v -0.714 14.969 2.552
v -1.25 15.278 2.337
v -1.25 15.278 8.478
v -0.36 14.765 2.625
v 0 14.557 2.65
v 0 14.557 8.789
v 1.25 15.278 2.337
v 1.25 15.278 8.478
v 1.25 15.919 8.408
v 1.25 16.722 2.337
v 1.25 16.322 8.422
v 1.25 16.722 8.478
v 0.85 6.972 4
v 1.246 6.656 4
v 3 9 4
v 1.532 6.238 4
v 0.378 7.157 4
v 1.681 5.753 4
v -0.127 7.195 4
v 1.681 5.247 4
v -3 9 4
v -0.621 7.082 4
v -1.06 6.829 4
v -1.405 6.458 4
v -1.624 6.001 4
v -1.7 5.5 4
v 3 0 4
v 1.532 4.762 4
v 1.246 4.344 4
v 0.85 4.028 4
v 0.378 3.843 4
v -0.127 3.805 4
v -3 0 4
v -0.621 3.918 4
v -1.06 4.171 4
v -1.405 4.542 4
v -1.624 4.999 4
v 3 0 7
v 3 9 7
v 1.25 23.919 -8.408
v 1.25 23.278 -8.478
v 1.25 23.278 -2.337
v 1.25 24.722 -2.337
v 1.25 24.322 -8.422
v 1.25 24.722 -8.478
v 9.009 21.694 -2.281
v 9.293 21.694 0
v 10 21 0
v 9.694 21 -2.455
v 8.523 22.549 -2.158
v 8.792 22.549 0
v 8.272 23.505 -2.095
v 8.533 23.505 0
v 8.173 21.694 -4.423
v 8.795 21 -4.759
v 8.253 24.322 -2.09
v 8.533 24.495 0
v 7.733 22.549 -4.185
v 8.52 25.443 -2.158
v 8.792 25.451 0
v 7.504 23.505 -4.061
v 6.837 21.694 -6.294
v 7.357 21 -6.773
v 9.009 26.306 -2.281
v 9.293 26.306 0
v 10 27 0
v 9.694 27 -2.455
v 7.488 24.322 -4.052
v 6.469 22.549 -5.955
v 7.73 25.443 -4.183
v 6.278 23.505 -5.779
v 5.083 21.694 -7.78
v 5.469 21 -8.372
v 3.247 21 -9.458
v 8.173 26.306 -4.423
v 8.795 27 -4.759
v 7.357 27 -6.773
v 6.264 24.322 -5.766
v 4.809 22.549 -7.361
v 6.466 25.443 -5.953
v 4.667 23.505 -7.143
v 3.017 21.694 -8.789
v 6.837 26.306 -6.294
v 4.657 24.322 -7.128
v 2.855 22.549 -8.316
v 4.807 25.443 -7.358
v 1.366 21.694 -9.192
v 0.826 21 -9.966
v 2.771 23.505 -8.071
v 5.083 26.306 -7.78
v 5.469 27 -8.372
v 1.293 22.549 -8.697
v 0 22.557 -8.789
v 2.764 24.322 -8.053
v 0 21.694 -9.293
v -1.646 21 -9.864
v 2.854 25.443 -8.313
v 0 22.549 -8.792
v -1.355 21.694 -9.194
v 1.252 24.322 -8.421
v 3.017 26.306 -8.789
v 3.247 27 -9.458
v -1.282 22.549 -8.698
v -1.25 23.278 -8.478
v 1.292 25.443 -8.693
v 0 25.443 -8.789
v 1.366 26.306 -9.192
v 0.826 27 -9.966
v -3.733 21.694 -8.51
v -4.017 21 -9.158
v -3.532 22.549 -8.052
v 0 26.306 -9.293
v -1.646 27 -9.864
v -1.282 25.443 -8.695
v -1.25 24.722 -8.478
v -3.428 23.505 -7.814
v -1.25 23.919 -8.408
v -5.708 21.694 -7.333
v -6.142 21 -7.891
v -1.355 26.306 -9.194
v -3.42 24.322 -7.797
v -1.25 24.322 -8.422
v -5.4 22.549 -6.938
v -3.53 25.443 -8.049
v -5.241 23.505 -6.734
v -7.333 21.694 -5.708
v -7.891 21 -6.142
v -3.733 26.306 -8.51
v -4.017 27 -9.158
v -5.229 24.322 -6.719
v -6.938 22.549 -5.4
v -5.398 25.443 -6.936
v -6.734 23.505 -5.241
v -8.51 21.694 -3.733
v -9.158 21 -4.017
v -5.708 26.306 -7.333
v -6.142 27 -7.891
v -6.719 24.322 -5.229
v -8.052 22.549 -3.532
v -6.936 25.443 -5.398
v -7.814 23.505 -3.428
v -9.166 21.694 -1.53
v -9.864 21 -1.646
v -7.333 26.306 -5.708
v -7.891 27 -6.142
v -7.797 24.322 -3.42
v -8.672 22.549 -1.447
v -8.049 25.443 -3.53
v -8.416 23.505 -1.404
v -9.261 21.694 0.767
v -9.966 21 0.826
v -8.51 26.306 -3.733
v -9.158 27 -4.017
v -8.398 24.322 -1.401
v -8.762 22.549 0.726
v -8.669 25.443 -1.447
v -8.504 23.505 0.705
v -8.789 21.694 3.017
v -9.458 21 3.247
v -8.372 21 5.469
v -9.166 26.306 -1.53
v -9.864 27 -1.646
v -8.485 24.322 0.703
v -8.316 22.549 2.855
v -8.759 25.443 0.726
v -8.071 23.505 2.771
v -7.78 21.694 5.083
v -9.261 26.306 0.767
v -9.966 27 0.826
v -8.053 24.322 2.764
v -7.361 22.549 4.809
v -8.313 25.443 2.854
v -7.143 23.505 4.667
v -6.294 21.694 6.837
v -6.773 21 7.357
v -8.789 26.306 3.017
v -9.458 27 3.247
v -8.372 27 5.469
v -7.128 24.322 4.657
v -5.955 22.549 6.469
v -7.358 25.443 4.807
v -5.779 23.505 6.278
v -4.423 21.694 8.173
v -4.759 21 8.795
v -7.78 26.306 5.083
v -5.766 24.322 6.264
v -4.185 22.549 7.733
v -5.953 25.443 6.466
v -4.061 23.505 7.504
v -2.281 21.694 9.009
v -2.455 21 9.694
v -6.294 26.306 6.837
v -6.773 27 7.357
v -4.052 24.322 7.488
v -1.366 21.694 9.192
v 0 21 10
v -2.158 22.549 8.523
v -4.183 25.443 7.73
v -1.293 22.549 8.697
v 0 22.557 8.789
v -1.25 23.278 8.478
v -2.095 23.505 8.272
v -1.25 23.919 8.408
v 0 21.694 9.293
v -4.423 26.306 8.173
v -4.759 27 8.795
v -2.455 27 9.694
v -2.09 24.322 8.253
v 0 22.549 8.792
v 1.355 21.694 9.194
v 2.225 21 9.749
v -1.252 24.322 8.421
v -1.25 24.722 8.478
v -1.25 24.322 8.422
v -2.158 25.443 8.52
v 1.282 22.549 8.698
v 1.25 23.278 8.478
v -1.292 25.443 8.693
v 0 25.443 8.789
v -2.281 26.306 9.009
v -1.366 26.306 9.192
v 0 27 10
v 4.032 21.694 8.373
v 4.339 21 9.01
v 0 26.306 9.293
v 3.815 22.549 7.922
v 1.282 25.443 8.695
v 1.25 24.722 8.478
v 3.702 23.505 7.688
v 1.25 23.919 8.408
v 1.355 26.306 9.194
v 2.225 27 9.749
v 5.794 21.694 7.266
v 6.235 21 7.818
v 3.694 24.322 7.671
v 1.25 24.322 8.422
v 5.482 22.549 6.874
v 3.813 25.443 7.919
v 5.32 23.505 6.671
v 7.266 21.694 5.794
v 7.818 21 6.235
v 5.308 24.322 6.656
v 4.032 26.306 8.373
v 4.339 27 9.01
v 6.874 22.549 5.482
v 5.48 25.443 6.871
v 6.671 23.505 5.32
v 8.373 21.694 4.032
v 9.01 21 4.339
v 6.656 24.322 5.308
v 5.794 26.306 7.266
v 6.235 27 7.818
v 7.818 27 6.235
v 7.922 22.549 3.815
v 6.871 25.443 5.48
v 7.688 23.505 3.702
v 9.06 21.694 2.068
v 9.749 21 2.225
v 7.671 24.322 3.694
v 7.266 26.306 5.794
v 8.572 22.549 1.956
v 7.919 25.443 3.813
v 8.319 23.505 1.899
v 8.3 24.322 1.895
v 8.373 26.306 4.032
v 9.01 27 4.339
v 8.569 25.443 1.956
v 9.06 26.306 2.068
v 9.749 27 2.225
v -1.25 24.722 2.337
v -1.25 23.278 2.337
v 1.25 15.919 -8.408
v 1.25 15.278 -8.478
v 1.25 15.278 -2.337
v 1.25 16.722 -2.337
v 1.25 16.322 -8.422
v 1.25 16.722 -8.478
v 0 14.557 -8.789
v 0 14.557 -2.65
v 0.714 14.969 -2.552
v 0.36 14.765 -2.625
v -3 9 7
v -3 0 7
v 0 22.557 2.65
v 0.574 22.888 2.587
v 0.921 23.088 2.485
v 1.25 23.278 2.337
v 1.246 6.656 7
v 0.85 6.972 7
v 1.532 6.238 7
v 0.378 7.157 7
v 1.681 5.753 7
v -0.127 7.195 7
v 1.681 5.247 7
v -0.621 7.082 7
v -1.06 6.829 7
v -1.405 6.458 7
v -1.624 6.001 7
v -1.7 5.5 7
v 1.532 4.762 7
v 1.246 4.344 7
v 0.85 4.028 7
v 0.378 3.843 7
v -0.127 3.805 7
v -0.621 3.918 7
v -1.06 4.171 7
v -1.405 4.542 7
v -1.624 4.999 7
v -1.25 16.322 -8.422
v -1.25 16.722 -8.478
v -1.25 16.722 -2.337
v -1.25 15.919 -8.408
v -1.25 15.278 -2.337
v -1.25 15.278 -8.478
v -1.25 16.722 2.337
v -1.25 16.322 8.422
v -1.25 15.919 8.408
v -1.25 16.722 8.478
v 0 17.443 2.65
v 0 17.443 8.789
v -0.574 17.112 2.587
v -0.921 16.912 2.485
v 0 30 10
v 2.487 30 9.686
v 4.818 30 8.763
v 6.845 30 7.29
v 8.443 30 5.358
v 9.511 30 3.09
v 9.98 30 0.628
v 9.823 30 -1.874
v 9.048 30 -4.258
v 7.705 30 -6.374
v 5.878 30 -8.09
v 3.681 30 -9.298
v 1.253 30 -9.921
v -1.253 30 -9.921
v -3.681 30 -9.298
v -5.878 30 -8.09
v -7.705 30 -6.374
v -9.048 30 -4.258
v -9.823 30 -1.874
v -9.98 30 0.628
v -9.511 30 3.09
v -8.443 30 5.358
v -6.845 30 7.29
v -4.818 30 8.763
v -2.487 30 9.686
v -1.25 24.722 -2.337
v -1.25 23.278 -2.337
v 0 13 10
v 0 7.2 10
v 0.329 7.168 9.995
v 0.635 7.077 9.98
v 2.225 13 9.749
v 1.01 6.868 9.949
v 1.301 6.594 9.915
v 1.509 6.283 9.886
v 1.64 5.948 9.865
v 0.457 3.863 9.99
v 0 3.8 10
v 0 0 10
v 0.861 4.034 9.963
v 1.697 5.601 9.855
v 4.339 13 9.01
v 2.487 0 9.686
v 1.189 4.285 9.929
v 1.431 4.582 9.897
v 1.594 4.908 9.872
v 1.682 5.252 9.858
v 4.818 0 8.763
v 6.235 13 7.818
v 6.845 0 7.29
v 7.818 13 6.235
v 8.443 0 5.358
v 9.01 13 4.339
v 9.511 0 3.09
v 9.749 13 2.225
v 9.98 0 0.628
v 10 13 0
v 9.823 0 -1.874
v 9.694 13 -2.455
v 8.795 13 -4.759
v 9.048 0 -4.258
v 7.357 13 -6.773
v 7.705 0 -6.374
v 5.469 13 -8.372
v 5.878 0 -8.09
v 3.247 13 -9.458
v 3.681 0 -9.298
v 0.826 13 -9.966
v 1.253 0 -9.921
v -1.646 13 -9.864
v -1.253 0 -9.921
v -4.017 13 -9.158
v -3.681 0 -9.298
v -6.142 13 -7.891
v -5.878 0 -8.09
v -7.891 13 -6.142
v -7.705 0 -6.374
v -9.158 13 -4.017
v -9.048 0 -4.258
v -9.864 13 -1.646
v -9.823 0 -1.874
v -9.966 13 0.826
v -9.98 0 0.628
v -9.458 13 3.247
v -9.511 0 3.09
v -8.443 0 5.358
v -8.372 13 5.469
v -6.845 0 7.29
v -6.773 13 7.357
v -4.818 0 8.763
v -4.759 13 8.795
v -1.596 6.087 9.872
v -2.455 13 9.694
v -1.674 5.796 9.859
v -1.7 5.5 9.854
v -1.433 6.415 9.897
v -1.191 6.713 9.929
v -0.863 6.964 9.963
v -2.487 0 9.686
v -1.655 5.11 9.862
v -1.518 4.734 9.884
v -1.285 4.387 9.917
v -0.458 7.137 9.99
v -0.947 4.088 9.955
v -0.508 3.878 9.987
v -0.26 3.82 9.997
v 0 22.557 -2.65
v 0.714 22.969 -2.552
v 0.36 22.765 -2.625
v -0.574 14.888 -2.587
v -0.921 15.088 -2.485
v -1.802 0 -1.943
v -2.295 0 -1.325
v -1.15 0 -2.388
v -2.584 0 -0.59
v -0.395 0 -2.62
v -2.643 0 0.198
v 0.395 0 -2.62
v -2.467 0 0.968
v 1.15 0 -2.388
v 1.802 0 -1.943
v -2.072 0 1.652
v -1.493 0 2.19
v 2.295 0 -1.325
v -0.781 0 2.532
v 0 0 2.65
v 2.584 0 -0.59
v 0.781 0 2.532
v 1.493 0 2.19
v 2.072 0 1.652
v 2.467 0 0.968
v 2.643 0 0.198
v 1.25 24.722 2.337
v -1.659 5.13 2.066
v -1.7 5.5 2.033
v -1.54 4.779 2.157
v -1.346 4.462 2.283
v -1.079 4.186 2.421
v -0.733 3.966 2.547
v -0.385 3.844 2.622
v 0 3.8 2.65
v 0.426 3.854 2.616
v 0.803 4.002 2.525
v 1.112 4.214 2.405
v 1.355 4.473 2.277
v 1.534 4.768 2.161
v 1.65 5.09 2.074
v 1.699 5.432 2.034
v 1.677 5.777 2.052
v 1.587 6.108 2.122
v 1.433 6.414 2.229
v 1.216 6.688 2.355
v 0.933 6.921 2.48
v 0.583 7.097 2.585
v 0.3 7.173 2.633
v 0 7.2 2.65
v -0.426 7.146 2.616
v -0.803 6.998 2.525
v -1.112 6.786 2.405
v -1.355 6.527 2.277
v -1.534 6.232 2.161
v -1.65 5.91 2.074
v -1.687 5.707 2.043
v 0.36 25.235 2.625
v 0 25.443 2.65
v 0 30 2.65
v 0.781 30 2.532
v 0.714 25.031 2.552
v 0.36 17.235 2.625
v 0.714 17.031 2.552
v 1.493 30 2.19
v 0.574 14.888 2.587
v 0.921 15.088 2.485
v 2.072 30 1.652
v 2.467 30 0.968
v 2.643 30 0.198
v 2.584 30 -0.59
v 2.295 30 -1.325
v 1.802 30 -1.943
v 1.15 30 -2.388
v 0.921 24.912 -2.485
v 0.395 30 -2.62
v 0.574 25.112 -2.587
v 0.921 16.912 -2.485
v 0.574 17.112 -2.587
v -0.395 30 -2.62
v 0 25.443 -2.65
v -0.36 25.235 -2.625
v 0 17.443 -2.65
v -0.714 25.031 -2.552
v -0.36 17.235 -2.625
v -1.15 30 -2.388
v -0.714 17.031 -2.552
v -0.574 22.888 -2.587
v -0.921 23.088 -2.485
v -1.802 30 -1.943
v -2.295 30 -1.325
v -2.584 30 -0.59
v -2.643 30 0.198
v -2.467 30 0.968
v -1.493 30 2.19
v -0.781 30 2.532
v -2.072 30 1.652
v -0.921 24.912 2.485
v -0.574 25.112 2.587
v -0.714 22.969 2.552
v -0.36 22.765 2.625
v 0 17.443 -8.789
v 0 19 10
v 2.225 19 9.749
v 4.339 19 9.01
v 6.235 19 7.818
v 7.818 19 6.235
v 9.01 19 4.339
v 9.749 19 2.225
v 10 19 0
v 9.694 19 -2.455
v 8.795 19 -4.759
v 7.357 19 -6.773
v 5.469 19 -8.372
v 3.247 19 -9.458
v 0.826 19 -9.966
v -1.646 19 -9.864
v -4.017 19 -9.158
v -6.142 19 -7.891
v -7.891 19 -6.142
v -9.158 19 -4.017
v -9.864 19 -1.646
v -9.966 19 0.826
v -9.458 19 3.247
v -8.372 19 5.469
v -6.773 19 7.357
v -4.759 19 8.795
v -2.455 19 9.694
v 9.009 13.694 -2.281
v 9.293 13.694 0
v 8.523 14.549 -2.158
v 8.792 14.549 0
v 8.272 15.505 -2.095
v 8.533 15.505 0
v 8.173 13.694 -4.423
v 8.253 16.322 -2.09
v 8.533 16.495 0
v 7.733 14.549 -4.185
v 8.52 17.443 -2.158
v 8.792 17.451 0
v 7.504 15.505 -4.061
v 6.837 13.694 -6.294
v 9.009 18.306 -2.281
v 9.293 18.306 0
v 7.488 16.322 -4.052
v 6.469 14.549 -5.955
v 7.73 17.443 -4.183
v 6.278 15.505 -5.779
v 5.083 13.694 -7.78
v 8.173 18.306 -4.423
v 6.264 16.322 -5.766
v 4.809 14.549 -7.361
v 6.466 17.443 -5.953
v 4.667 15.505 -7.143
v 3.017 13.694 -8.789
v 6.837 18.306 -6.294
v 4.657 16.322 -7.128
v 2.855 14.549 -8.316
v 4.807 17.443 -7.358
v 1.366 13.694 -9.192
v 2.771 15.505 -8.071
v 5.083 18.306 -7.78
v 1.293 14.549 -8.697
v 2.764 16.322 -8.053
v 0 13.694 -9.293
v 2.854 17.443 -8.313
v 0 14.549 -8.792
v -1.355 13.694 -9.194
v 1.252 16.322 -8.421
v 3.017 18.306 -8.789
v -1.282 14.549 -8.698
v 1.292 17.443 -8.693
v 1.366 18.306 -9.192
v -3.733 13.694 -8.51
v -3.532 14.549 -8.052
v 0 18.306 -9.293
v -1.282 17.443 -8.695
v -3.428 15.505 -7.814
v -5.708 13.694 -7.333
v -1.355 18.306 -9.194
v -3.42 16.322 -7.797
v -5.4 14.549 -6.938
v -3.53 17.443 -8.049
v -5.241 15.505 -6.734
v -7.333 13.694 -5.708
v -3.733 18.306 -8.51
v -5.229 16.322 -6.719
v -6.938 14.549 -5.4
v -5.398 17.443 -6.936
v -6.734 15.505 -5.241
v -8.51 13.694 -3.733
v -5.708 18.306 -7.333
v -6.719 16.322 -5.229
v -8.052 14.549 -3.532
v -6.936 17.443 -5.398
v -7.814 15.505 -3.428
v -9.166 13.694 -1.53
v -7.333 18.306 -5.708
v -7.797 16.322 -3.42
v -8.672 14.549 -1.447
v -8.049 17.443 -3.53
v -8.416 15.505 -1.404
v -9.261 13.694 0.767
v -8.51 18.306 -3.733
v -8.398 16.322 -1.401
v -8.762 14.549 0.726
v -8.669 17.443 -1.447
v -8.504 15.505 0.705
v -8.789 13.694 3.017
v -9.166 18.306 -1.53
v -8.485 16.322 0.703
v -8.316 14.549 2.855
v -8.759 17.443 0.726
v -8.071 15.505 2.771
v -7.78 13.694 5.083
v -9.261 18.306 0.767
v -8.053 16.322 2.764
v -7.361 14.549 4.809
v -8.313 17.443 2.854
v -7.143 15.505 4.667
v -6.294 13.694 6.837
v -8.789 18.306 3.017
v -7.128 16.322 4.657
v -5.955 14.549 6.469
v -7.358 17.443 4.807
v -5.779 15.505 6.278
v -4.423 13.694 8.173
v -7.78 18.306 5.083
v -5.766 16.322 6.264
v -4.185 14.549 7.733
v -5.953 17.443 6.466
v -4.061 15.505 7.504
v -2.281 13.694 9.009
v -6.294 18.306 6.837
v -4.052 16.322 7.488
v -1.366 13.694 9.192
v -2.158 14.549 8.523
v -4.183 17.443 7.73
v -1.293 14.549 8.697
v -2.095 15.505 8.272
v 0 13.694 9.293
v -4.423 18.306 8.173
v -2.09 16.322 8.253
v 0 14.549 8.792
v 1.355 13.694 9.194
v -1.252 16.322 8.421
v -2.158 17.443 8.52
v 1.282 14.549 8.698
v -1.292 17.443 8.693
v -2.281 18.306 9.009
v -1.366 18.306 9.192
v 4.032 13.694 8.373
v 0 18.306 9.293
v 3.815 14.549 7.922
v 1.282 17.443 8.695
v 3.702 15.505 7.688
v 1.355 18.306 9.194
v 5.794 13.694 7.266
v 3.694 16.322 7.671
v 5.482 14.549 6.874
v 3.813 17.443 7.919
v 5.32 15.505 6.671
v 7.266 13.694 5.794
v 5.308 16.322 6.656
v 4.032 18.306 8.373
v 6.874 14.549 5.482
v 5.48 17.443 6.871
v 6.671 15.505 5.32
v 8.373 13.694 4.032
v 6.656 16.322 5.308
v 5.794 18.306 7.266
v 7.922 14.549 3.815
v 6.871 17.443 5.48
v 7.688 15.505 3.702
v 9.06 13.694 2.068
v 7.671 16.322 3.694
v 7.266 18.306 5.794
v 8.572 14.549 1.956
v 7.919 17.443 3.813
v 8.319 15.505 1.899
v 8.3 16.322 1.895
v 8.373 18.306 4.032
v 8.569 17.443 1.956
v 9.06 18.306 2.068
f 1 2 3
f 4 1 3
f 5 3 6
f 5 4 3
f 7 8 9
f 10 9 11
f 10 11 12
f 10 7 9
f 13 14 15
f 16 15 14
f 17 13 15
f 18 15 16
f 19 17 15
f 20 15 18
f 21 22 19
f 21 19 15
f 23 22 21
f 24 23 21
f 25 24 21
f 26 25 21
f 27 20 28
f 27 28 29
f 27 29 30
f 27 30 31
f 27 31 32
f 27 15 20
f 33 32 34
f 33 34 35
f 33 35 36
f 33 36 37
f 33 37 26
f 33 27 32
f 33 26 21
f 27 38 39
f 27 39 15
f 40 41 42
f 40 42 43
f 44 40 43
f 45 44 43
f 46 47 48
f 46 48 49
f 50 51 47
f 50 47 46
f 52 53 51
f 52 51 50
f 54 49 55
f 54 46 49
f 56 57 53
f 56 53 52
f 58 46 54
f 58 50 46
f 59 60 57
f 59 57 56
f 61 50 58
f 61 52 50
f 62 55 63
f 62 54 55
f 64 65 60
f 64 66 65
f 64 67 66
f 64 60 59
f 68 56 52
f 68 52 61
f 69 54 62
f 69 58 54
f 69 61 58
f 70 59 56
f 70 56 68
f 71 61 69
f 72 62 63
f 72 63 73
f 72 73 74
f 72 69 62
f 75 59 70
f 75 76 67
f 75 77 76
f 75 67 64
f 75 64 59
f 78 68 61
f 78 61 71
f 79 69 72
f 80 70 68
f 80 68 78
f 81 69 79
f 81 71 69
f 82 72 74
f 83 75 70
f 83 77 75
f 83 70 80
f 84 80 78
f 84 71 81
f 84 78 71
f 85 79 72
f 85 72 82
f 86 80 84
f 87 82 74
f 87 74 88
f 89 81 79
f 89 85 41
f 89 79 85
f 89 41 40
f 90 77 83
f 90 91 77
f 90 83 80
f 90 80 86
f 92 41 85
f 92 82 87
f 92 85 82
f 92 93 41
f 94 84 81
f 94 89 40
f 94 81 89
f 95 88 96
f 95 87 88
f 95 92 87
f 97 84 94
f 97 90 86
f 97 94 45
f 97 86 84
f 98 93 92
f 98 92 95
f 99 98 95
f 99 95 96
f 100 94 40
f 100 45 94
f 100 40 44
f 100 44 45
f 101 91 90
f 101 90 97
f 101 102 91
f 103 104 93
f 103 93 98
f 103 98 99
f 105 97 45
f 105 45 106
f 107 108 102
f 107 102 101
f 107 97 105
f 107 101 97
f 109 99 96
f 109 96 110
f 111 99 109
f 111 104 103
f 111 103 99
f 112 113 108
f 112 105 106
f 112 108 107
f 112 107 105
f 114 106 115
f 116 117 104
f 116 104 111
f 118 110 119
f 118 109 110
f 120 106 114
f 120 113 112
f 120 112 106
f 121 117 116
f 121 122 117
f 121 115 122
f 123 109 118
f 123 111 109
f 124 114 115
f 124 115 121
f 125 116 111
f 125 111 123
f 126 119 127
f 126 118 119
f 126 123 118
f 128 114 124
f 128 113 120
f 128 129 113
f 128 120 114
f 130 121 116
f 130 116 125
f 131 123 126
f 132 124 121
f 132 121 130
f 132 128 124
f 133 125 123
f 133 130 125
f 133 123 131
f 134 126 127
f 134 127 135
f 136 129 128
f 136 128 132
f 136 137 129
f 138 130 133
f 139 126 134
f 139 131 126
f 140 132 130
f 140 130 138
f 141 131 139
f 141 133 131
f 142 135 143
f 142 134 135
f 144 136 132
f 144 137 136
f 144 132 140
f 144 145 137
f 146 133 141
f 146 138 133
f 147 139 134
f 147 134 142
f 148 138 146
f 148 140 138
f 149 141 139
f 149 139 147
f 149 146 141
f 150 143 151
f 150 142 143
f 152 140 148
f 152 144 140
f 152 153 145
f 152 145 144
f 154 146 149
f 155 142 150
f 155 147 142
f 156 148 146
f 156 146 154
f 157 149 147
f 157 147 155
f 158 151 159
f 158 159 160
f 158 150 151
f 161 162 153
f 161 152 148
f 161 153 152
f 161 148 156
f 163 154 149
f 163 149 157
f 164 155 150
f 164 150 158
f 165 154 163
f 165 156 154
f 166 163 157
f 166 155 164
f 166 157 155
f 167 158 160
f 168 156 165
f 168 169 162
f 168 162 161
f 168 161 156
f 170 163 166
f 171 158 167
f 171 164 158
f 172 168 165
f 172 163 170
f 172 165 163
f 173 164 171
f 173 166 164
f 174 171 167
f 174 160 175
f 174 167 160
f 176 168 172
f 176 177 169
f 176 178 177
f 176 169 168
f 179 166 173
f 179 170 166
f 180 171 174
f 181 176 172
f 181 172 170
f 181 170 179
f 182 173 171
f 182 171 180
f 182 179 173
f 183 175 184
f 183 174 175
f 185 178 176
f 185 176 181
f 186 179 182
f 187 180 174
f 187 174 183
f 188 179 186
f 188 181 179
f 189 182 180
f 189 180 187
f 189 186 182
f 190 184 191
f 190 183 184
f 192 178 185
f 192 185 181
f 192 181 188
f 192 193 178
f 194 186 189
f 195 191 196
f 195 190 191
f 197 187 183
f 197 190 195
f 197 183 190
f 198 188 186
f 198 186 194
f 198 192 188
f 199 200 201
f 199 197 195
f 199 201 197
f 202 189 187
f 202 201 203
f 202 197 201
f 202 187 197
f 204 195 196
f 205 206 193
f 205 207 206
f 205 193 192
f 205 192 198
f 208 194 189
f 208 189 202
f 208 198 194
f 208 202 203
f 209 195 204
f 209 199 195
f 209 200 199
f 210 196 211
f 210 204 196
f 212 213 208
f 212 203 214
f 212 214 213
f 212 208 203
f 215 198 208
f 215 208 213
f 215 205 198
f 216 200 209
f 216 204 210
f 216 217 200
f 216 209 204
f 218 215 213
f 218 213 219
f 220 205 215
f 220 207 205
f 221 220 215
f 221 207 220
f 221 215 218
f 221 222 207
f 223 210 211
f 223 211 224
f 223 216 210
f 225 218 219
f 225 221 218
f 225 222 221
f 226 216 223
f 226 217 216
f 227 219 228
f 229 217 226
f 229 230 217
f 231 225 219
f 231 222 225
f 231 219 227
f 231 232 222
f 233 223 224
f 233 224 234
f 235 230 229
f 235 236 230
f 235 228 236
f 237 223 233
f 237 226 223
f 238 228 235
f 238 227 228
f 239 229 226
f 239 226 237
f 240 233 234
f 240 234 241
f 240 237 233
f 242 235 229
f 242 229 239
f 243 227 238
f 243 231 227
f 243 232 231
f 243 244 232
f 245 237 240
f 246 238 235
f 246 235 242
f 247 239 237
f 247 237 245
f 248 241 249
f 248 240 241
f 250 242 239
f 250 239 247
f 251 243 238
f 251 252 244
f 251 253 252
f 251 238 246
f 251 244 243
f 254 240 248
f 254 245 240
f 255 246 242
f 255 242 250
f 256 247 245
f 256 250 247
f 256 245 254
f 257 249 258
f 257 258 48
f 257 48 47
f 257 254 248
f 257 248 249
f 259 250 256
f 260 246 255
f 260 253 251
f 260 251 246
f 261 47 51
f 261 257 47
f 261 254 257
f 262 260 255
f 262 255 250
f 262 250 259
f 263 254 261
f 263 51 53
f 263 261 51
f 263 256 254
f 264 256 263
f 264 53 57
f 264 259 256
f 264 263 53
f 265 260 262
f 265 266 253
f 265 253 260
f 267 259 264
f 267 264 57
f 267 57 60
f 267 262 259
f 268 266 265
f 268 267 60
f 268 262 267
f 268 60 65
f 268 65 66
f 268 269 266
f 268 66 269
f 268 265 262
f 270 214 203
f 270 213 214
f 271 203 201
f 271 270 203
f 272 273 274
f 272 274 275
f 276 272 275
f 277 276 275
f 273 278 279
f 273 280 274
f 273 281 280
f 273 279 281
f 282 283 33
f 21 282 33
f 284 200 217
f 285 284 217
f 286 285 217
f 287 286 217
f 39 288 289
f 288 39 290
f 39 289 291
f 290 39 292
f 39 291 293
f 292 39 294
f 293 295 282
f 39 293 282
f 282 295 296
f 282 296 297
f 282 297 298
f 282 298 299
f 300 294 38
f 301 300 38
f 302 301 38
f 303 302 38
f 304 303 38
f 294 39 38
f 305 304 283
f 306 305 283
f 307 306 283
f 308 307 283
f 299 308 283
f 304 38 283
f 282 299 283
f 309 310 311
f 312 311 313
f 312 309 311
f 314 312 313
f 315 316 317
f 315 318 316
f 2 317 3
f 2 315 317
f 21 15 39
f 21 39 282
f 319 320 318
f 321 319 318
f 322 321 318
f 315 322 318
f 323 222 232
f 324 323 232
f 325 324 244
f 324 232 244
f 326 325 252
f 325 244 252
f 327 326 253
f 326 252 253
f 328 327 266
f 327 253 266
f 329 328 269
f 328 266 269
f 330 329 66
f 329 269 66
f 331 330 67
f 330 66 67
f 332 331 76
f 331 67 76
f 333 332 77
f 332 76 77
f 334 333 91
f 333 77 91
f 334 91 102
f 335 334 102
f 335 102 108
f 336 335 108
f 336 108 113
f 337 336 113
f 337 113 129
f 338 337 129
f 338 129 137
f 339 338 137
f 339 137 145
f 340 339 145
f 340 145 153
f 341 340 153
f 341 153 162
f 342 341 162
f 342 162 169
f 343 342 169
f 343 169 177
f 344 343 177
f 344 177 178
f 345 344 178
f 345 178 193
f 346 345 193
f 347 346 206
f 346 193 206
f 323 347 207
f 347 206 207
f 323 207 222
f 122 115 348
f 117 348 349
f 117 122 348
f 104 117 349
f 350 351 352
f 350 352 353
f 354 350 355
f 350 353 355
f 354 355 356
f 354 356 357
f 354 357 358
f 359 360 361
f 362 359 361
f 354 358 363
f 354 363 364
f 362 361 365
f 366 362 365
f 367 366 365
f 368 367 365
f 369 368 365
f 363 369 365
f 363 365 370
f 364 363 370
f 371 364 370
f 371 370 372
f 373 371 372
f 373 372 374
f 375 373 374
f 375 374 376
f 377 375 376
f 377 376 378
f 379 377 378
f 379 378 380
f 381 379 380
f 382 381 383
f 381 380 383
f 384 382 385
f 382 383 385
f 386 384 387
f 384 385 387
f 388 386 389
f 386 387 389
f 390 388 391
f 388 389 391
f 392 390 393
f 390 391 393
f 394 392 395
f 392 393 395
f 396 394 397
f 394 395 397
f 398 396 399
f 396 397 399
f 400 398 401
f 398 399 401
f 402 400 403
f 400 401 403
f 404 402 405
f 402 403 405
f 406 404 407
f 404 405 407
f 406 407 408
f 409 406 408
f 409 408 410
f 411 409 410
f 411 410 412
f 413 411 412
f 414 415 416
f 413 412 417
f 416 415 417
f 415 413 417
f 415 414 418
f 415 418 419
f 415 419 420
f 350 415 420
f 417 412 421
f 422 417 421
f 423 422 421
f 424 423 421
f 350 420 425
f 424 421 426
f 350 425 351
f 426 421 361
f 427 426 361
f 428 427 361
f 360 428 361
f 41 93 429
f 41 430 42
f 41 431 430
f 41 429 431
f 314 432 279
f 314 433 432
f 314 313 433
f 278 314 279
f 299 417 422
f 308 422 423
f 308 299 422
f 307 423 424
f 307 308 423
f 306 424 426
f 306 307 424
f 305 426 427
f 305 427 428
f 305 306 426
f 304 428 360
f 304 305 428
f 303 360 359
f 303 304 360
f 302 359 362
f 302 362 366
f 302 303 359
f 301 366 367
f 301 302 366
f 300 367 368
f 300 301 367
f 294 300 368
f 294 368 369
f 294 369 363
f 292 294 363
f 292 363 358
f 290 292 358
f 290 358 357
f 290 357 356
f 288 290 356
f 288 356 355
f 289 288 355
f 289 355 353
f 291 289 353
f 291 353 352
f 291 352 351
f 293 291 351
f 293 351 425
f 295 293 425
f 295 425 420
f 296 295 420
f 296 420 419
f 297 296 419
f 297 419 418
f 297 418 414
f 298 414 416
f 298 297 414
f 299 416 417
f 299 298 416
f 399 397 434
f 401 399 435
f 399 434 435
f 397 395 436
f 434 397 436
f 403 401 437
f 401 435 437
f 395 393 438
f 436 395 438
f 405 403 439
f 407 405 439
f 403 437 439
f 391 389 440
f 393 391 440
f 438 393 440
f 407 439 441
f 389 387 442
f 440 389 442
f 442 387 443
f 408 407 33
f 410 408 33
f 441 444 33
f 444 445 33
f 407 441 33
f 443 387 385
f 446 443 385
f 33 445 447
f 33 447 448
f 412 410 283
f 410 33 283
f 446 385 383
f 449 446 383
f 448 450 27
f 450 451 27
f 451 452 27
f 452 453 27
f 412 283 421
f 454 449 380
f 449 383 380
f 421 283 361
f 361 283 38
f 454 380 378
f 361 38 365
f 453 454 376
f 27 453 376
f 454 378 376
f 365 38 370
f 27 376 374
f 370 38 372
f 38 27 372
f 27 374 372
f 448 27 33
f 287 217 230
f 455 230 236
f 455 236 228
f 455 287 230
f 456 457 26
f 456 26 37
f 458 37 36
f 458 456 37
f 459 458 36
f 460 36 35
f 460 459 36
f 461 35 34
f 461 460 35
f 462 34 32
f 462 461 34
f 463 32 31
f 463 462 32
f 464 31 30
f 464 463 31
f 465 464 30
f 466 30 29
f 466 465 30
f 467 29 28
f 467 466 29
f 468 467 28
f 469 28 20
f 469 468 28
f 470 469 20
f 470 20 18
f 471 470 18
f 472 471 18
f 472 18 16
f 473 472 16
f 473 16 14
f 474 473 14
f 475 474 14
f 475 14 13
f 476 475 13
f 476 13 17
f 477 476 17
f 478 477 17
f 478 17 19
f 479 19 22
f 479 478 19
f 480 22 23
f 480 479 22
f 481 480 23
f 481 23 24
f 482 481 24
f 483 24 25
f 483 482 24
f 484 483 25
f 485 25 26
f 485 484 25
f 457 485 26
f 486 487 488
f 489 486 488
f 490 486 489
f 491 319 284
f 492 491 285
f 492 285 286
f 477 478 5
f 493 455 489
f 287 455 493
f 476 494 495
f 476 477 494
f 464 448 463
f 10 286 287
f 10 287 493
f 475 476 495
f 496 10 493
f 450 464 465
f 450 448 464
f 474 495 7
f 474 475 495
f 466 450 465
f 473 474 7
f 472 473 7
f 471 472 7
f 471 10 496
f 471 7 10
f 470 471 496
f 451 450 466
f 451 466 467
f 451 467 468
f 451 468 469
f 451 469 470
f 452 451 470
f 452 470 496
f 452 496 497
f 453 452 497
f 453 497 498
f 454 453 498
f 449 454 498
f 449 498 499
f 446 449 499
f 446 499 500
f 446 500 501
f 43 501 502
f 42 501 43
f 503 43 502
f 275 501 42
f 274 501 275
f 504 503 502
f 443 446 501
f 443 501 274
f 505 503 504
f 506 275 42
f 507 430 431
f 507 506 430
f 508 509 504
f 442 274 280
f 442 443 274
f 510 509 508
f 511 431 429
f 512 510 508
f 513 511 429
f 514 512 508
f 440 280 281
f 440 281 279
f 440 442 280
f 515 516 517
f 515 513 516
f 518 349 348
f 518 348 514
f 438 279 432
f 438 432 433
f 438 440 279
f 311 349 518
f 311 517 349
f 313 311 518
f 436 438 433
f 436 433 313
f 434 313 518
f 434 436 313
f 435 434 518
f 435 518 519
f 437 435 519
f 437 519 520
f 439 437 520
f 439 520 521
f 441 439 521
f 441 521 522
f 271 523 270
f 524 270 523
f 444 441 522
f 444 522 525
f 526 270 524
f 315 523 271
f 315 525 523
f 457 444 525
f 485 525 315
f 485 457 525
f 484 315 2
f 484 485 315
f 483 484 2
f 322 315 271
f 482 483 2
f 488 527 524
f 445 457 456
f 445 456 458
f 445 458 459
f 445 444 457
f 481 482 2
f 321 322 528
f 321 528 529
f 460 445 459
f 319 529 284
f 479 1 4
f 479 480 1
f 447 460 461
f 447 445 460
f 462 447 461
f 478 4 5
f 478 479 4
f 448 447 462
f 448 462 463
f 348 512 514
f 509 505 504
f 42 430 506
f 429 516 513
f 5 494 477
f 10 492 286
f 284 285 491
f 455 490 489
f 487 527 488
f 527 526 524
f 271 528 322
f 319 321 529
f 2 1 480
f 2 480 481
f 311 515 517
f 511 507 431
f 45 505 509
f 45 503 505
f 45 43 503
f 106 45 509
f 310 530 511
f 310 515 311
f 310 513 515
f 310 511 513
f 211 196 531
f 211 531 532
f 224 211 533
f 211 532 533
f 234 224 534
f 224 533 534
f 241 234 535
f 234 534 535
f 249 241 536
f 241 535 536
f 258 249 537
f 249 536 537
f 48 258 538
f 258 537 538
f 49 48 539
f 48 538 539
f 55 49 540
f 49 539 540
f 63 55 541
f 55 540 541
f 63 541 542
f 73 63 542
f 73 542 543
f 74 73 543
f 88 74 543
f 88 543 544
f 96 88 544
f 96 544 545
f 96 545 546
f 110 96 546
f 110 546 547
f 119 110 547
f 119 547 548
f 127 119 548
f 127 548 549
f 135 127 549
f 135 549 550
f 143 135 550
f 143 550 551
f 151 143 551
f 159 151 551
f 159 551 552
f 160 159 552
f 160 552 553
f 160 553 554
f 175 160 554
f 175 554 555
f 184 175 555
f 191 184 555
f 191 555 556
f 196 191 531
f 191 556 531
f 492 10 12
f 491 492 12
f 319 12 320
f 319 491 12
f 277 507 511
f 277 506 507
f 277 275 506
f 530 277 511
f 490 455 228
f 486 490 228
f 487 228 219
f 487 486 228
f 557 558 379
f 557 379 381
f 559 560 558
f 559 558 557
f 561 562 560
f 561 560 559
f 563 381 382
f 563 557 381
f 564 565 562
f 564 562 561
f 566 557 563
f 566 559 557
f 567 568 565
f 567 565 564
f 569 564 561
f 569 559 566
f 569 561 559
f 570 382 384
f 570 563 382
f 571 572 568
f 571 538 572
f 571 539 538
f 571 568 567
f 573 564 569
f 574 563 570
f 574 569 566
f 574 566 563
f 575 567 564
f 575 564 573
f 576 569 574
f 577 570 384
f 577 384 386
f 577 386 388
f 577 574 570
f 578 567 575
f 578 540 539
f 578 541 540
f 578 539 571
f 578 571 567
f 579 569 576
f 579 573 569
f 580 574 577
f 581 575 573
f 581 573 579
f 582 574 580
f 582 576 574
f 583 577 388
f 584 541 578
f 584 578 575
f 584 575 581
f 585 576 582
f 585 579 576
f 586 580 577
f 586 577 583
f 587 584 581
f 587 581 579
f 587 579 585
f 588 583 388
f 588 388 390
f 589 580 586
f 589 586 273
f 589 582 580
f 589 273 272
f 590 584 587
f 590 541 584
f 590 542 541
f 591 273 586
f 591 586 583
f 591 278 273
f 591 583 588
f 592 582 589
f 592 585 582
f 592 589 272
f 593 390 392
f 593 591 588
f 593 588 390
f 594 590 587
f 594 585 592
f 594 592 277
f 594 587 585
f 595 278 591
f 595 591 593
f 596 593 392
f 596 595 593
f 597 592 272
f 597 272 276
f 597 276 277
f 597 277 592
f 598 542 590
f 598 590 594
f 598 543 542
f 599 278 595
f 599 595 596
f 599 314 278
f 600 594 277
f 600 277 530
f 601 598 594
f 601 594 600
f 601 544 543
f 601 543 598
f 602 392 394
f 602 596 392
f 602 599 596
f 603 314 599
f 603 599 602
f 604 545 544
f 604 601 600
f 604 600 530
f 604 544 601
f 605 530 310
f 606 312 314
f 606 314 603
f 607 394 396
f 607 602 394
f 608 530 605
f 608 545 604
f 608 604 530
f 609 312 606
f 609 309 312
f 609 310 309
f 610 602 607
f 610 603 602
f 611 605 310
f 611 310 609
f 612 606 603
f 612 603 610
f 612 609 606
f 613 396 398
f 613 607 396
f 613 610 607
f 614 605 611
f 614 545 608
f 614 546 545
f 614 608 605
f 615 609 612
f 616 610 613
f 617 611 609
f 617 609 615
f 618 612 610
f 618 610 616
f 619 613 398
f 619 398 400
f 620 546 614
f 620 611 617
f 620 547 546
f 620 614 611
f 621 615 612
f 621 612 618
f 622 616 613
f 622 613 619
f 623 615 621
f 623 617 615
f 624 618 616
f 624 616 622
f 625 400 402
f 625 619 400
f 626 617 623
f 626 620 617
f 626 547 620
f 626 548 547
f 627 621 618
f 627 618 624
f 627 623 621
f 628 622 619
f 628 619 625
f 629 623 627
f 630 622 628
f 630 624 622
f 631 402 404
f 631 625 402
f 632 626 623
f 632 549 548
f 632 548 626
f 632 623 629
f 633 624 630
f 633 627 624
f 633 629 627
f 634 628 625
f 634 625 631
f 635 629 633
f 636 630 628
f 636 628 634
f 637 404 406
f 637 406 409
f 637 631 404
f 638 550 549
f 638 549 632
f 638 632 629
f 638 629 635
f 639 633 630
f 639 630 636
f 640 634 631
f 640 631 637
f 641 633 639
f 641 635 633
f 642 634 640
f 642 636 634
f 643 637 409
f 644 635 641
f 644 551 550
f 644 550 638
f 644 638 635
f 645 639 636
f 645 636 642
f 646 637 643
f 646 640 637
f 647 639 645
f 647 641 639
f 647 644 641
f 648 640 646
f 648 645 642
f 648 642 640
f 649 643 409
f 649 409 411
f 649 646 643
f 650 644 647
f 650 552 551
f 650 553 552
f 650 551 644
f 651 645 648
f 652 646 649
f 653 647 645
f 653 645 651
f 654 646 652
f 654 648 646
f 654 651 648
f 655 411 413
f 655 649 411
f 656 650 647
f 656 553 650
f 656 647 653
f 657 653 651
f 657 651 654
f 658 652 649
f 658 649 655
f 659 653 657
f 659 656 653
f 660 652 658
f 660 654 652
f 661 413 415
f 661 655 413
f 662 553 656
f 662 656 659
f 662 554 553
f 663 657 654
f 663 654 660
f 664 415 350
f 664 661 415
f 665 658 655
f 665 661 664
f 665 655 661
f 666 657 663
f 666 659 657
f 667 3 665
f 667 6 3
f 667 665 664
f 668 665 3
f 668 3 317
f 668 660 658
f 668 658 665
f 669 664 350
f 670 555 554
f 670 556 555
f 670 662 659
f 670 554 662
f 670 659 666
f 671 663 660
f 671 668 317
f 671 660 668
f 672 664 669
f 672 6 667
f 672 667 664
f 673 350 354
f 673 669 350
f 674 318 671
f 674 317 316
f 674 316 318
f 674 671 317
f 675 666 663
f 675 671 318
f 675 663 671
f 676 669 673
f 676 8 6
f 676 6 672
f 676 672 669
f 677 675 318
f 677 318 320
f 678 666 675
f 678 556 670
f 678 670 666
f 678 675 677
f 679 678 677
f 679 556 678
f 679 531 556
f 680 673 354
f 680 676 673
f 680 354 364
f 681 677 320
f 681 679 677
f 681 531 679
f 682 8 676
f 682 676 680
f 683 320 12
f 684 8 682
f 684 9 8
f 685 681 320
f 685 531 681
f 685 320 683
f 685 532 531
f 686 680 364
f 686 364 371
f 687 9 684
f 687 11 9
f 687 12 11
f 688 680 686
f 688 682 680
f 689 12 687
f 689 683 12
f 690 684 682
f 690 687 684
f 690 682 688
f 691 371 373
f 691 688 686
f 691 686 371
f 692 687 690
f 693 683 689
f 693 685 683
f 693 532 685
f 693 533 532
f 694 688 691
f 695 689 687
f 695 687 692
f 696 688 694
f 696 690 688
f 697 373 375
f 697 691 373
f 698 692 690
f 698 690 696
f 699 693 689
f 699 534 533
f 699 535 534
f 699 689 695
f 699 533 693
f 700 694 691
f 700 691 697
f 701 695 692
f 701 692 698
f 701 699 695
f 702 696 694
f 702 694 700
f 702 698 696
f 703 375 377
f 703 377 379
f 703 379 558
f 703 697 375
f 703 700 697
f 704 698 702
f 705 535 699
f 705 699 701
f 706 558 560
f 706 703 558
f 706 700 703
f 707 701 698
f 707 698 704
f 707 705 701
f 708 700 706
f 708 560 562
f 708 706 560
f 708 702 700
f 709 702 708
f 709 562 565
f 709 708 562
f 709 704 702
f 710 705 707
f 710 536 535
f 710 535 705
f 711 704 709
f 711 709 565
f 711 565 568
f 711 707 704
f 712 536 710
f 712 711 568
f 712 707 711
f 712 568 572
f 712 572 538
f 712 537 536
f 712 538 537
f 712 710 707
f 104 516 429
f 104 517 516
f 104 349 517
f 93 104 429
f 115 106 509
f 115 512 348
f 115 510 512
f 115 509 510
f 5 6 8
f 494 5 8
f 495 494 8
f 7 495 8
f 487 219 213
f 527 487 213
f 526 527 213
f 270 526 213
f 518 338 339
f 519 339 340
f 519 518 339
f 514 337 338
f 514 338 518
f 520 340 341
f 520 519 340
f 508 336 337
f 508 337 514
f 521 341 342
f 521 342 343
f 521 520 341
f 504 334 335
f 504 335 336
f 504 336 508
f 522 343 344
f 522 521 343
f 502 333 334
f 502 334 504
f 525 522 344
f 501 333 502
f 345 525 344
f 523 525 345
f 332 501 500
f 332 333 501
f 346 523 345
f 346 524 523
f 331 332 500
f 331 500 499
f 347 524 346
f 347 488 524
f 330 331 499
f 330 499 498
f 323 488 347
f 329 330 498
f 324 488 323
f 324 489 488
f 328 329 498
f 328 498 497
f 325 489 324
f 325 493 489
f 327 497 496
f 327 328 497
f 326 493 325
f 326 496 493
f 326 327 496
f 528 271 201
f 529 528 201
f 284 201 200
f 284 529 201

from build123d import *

# Parameters (mm, degrees)
CROQUIS1_R                 = 10
CROQUIS1_R_2               = 2.65
SALIENTE_EXTRUIR1_DEPTH    = 30
CROQUIS2_R                 = 1.7
CORTAR_EXTRUIR1_DEPTH      = 30
CROQUIS3_W                 = 6
CROQUIS3_H                 = 3
CORTAR_EXTRUIR2_DEPTH      = 9
CORTAR_EXTRUIR3_DEPTH      = 34.166248054
CORTAR_EXTRUIR3_DEPTH_BACK = 34.166248054


with BuildPart() as part:
    # Croquis1 → Saliente-Extruir1 (new body)
    with BuildSketch(Plane(origin=(0, 0, 0), x_dir=(1, 0, 0), z_dir=(0, 1, 0))):
        with Locations(Location((0, 0, 0), (0, 0, 270))):
            Circle(CROQUIS1_R)
        with Locations(Location((0, 0, 0), (0, 0, 270))):
            Circle(CROQUIS1_R_2, mode=Mode.SUBTRACT)
    extrude(amount=SALIENTE_EXTRUIR1_DEPTH)

    # Croquis2 → Cortar-Extruir1 (cut)
    with BuildSketch(Plane.XY):
        with Locations(Location((0, 5.5, 0), (0, 0, 180))):
            Circle(CROQUIS2_R)
    extrude(amount=CORTAR_EXTRUIR1_DEPTH, mode=Mode.SUBTRACT)

    # Croquis3 → Cortar-Extruir2 (cut)
    with BuildSketch(Plane(origin=(0, 0, 0), x_dir=(-1, 0, 0), z_dir=(0, -1, 0))):
        with Locations((0, -5.5)):
            Rectangle(CROQUIS3_W, CROQUIS3_H)
    extrude(amount=-CORTAR_EXTRUIR2_DEPTH, mode=Mode.SUBTRACT)

    # Croquis4 → Cortar-Extruir3 (cut, two sides: drawn at the far end of the back side and taken through both)
    with BuildSketch(Plane.XY.offset(-CORTAR_EXTRUIR3_DEPTH_BACK)):
        Polygon((0, 17.443375673), (-1.25, 16.721687836), (-1.25, 15.278312164), (0, 14.556624327), (1.25, 15.278312164), (1.25, 16.721687836), align=None)
        Polygon((0, 25.443375673), (-1.25, 24.721687836), (-1.25, 23.278312164), (0, 22.556624327), (1.25, 23.278312164), (1.25, 24.721687836), align=None)
    extrude(amount=CORTAR_EXTRUIR3_DEPTH + CORTAR_EXTRUIR3_DEPTH_BACK, mode=Mode.SUBTRACT)

    # Croquis5 → Cortar-Revolución1 (revolve, cut)
    with BuildSketch(Plane.XY, mode=Mode.PRIVATE) as cortar_revoluci_n1_sk:
        with BuildLine():
            Line((-10, 27), (-10, 21))
            ThreePointArc((-10, 21), (-8.5, 24), (-10, 27))
        make_face()
        with BuildLine():
            Line((-10, 19), (-10, 13))
            ThreePointArc((-10, 13), (-8.5, 16), (-10, 19))
        make_face()
    revolve(cortar_revoluci_n1_sk.sketch.rotate(Axis((0, 16, 0), (0, 1, 0)), 180), axis=Axis((0, 16, 0), (0, 1, 0)), mode=Mode.SUBTRACT)


solid = part.part
